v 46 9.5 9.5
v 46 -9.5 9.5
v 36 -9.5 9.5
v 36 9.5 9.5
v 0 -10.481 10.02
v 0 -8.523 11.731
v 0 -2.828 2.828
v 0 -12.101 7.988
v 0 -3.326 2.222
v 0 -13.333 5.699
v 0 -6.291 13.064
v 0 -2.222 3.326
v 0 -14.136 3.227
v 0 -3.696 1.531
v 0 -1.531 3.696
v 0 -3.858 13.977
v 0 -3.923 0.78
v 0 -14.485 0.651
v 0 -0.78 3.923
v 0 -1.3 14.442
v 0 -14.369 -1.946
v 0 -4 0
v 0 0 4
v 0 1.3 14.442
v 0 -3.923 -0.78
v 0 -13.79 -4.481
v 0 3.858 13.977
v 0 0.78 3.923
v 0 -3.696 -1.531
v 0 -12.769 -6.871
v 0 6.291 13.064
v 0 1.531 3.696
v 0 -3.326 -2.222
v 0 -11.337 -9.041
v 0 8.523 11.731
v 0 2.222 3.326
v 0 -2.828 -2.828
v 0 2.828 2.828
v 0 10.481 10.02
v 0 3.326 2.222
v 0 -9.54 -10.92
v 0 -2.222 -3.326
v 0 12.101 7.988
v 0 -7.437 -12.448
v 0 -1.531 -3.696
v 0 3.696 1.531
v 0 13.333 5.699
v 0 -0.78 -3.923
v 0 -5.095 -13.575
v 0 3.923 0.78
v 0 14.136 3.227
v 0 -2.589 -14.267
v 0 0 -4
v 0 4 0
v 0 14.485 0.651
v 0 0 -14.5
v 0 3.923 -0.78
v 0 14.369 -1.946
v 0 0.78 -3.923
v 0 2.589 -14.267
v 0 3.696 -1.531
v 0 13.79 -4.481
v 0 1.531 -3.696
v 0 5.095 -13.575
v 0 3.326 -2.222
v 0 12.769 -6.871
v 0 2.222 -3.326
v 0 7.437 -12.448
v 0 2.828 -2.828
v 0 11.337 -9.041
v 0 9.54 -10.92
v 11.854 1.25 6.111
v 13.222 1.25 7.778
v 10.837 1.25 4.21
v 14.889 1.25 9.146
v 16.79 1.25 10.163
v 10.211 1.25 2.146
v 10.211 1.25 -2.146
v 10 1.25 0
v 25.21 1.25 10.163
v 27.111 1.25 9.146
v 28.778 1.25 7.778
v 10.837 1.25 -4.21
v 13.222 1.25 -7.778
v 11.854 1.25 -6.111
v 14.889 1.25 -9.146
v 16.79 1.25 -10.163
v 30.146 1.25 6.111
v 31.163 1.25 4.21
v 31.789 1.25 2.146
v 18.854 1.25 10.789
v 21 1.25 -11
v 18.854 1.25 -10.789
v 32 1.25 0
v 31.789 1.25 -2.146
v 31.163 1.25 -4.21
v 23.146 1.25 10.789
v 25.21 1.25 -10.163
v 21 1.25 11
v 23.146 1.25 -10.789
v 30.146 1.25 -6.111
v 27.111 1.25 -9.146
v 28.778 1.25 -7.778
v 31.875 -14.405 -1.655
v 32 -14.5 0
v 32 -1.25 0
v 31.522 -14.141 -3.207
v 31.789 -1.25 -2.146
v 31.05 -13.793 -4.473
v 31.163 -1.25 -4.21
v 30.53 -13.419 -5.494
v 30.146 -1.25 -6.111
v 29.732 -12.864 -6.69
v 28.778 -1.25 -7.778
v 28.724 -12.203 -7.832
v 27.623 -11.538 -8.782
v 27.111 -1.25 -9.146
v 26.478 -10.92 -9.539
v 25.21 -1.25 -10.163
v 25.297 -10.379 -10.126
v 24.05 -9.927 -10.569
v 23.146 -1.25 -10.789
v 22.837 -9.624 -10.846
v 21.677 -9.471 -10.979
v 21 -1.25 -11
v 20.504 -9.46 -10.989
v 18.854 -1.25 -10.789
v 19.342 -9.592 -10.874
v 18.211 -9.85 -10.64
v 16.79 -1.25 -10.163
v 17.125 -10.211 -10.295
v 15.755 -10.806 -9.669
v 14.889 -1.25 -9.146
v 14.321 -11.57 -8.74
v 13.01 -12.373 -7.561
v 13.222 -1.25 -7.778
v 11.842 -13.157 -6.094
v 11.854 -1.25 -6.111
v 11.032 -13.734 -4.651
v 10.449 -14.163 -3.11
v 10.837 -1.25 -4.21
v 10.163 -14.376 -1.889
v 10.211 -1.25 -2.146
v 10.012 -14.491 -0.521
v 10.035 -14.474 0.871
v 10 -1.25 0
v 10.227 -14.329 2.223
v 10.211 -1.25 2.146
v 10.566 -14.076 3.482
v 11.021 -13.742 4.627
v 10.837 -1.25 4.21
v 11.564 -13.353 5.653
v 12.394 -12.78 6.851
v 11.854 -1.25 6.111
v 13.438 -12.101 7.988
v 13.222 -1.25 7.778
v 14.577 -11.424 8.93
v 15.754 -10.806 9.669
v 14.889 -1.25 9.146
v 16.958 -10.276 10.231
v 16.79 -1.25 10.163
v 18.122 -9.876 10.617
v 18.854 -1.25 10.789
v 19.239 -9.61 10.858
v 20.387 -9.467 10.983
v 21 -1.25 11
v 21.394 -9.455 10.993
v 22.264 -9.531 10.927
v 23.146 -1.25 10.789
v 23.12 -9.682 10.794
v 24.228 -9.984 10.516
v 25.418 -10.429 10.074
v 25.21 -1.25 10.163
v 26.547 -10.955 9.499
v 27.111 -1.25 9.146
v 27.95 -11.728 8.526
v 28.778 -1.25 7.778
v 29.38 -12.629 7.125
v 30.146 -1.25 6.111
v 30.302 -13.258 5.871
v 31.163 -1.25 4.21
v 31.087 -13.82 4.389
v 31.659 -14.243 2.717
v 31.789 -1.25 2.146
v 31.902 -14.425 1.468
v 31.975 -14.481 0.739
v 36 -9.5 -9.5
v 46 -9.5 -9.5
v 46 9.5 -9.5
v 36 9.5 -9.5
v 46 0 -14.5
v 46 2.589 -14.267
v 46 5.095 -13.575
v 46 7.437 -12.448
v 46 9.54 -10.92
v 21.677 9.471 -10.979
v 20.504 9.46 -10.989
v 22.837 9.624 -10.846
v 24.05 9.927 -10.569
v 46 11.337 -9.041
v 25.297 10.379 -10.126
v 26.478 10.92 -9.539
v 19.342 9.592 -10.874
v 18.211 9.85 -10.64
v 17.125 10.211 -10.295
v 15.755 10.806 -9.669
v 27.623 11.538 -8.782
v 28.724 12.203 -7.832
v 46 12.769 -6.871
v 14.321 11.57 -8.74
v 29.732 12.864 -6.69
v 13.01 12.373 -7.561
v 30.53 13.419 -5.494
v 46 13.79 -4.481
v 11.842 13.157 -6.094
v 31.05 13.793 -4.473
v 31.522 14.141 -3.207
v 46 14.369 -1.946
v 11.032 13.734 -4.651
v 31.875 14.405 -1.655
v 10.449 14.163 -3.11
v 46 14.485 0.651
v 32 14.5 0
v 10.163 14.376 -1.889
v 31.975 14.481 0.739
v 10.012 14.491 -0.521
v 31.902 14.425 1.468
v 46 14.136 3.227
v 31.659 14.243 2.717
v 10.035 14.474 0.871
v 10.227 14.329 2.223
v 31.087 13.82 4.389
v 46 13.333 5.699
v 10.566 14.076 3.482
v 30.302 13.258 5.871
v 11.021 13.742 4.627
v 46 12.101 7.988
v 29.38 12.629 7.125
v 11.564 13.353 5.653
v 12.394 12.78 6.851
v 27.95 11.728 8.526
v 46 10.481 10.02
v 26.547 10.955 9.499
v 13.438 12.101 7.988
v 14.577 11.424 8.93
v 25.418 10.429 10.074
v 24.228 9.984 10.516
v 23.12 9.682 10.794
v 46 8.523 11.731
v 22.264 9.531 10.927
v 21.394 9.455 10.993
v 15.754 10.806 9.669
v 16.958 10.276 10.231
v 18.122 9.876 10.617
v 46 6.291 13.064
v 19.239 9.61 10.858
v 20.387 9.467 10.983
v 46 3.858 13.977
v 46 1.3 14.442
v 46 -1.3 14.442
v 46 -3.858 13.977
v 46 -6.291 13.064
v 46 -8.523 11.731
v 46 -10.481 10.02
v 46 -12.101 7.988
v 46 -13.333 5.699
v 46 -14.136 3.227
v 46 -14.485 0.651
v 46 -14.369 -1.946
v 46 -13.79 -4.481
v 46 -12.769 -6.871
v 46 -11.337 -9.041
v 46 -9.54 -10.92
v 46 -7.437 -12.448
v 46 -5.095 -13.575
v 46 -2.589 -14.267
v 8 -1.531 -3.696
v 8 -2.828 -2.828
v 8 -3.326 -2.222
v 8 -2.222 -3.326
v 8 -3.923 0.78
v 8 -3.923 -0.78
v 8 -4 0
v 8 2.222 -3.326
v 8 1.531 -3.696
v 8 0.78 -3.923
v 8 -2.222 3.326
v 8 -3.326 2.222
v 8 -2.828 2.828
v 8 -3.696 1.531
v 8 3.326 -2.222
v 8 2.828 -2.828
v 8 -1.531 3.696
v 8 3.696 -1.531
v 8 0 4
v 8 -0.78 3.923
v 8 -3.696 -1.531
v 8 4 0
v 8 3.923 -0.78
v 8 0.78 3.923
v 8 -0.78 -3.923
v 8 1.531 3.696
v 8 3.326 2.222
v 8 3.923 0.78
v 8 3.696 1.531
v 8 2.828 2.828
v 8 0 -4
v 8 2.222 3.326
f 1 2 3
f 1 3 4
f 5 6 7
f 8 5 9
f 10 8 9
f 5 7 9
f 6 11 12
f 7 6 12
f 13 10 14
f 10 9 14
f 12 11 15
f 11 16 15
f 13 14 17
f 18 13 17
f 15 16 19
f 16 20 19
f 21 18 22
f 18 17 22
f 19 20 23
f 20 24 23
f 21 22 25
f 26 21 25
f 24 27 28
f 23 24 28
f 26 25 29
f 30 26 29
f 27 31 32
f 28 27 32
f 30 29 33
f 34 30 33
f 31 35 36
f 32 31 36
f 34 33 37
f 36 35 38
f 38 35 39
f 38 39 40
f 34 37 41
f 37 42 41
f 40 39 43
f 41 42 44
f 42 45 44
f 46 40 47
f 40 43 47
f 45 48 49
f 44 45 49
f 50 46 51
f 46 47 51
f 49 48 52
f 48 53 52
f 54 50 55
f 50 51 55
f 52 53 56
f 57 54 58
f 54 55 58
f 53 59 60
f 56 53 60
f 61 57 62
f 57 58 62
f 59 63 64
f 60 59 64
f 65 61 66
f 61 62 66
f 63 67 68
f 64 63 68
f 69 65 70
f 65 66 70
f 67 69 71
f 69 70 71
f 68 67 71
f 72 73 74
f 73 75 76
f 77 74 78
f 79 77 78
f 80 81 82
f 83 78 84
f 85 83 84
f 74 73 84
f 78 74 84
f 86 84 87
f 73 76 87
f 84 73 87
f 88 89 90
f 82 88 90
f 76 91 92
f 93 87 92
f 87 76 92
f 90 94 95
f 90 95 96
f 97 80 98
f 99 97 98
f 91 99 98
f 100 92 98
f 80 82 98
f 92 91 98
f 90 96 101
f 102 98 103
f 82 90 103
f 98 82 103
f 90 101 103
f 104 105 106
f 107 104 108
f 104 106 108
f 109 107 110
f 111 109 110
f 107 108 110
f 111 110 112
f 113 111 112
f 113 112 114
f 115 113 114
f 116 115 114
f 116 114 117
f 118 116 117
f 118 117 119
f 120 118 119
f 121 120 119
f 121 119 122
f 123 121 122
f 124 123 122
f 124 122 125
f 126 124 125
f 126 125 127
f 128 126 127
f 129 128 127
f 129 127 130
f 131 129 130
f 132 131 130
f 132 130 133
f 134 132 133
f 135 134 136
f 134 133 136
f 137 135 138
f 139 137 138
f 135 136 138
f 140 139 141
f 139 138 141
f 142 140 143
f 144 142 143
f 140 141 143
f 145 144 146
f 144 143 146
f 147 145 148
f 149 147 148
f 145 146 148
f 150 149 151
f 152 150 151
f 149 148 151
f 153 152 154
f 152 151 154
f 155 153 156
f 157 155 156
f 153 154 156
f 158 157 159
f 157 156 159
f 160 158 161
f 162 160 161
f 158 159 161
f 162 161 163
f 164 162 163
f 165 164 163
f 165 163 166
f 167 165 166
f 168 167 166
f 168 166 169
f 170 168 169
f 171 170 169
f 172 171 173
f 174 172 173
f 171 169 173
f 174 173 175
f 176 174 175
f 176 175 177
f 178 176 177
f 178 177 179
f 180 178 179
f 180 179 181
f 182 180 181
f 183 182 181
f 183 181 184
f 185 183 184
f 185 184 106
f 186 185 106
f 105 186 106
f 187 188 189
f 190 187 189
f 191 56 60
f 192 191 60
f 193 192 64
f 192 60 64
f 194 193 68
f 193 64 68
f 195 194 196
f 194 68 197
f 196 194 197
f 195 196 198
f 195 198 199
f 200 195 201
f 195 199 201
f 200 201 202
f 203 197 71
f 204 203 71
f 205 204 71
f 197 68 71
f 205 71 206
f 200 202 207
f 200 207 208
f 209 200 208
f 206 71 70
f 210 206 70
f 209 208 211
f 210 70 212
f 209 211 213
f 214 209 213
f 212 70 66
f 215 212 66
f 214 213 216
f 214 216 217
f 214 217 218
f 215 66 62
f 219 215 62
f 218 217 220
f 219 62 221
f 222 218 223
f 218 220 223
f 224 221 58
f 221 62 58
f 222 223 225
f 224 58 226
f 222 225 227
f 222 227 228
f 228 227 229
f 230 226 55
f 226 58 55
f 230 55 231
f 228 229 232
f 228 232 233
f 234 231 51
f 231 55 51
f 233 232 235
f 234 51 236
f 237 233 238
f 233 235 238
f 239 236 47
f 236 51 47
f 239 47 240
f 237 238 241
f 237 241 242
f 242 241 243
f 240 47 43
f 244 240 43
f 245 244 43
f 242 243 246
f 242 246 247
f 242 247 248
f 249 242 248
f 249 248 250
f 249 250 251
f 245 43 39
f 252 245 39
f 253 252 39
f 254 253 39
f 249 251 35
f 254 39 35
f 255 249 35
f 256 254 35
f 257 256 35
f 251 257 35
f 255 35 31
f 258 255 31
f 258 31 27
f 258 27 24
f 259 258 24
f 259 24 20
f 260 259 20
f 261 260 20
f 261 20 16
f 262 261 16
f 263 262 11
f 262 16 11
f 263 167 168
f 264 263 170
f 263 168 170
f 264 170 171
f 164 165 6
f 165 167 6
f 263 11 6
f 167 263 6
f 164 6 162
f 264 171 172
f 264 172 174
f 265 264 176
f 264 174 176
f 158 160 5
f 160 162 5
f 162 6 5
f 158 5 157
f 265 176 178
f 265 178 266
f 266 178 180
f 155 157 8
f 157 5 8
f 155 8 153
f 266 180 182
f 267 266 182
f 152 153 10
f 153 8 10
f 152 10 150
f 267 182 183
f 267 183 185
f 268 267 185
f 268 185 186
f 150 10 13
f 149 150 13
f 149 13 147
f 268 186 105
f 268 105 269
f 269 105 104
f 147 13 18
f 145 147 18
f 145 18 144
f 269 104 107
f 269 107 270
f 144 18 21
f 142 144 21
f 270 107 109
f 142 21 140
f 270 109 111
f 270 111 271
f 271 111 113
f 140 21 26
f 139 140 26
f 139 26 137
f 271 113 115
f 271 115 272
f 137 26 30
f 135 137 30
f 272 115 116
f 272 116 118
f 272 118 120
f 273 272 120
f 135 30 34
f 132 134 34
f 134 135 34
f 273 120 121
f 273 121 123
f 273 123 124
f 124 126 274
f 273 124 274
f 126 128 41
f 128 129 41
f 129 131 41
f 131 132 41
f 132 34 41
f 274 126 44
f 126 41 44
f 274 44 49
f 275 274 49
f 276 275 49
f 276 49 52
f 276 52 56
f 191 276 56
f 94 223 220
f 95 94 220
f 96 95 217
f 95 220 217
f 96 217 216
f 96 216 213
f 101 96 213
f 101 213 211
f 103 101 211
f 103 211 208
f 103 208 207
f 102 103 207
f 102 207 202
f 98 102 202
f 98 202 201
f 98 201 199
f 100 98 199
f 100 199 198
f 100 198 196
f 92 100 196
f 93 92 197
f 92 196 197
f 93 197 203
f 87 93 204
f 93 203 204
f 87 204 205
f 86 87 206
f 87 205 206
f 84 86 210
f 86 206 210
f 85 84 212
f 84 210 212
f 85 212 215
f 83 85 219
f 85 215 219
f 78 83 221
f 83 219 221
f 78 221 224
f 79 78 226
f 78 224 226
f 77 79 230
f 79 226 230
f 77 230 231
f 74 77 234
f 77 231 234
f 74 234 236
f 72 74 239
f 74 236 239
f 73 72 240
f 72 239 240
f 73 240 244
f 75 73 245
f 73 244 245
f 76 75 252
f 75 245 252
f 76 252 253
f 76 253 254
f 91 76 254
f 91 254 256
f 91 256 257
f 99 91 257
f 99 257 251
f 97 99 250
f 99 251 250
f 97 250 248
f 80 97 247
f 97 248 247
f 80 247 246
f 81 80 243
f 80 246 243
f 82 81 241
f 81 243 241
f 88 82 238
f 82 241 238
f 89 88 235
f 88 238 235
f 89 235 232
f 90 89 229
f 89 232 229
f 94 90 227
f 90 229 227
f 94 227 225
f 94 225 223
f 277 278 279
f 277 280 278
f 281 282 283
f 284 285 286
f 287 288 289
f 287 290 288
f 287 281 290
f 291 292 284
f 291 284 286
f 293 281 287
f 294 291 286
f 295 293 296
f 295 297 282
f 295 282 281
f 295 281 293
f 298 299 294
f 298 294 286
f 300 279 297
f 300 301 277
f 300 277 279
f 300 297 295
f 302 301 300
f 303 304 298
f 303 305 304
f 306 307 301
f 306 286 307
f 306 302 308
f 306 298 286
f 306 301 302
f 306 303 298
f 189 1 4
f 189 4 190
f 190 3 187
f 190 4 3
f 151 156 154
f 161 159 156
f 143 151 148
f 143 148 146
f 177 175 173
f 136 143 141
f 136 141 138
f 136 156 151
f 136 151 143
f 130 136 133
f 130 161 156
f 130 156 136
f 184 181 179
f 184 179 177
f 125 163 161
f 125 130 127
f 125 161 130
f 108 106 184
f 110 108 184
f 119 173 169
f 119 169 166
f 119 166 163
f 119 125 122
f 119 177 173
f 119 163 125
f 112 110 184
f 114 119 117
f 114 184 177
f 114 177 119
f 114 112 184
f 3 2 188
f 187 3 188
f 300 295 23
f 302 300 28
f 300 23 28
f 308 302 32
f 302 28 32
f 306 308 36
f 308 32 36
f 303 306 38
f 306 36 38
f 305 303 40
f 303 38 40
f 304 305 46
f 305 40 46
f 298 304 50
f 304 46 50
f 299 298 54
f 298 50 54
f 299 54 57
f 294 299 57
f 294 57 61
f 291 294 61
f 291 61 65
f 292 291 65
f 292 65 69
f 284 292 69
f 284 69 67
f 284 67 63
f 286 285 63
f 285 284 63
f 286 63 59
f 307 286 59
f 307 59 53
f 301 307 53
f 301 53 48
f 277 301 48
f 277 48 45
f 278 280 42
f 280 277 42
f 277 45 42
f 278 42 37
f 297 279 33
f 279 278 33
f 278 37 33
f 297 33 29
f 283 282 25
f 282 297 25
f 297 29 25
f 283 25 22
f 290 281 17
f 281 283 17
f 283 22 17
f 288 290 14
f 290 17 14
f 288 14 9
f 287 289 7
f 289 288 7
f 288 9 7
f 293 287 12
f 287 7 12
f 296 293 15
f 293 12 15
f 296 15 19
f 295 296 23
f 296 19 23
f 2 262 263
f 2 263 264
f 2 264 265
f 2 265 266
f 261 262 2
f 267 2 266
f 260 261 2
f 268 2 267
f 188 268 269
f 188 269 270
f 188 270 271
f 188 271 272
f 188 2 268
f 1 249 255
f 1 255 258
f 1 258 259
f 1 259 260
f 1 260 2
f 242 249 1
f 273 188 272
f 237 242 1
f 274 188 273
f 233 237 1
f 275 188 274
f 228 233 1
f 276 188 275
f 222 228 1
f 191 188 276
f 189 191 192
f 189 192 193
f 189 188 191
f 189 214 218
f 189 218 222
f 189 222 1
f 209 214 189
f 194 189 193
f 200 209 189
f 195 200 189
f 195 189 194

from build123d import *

# Parameters (mm, degrees)
CROQUIS1_R                 = 14.5
SALIENTE_EXTRUIR1_DEPTH    = 46
CROQUIS2_R                 = 4
CORTAR_EXTRUIR1_DEPTH      = 8
CROQUIS3_R                 = 11
CORTAR_EXTRUIR2_DEPTH      = 15.5
CORTAR_EXTRUIR2_DEPTH_BACK = 15.5
CROQUIS4_W                 = 19
CROQUIS4_H                 = 19
CORTAR_EXTRUIR3_DEPTH      = 10
CROQUIS5_W                 = 19
CROQUIS5_H                 = 2.5
SALIENTE_EXTRUIR2_DEPTH    = 28
CROQUIS7_R                 = 11.15
SALIENTE_EXTRUIR3_DEPTH    = 2.5


with BuildPart() as part:
    # Croquis1 → Saliente-Extruir1 (new body)
    with BuildSketch(Plane(origin=(0, 0, 0), x_dir=(0, 0, -1), z_dir=(1, 0, 0))):
        Circle(CROQUIS1_R)
    extrude(amount=SALIENTE_EXTRUIR1_DEPTH)

    # Croquis2 → Cortar-Extruir1 (cut)
    with BuildSketch(Plane.ZY):
        Circle(CROQUIS2_R)
    extrude(amount=-CORTAR_EXTRUIR1_DEPTH, mode=Mode.SUBTRACT)

    # Croquis3 → Cortar-Extruir2 (cut, two sides)
    with BuildSketch(Plane(origin=(0, 0, 0), x_dir=(1, 0, 0), z_dir=(0, 1, 0))) as cortar_extruir2_sk:
        with Locations((21, 0)):
            Circle(CROQUIS3_R)
    extrude(amount=CORTAR_EXTRUIR2_DEPTH, mode=Mode.SUBTRACT)
    extrude(cortar_extruir2_sk.sketch, amount=-CORTAR_EXTRUIR2_DEPTH_BACK, mode=Mode.SUBTRACT)

    # Croquis4 → Cortar-Extruir3 (cut)
    with BuildSketch(Plane(origin=(46, 0, 0), x_dir=(0, 0, -1), z_dir=(1, 0, 0))):
        Rectangle(CROQUIS4_W, CROQUIS4_H)
    extrude(amount=-CORTAR_EXTRUIR3_DEPTH, mode=Mode.SUBTRACT)

    # Croquis5 → Saliente-Extruir2 (add)
    with BuildSketch(Plane(origin=(36, 0, 0), x_dir=(0, 0, -1), z_dir=(1, 0, 0))):
        Rectangle(CROQUIS5_W, CROQUIS5_H)
    extrude(amount=-SALIENTE_EXTRUIR2_DEPTH)

    # Croquis7 → Saliente-Extruir3 (add)
    with BuildSketch(Plane.XZ.offset(1.25)):
        with Locations((21, 0)):
            Circle(CROQUIS7_R)
    extrude(amount=-SALIENTE_EXTRUIR3_DEPTH)


solid = part.part
